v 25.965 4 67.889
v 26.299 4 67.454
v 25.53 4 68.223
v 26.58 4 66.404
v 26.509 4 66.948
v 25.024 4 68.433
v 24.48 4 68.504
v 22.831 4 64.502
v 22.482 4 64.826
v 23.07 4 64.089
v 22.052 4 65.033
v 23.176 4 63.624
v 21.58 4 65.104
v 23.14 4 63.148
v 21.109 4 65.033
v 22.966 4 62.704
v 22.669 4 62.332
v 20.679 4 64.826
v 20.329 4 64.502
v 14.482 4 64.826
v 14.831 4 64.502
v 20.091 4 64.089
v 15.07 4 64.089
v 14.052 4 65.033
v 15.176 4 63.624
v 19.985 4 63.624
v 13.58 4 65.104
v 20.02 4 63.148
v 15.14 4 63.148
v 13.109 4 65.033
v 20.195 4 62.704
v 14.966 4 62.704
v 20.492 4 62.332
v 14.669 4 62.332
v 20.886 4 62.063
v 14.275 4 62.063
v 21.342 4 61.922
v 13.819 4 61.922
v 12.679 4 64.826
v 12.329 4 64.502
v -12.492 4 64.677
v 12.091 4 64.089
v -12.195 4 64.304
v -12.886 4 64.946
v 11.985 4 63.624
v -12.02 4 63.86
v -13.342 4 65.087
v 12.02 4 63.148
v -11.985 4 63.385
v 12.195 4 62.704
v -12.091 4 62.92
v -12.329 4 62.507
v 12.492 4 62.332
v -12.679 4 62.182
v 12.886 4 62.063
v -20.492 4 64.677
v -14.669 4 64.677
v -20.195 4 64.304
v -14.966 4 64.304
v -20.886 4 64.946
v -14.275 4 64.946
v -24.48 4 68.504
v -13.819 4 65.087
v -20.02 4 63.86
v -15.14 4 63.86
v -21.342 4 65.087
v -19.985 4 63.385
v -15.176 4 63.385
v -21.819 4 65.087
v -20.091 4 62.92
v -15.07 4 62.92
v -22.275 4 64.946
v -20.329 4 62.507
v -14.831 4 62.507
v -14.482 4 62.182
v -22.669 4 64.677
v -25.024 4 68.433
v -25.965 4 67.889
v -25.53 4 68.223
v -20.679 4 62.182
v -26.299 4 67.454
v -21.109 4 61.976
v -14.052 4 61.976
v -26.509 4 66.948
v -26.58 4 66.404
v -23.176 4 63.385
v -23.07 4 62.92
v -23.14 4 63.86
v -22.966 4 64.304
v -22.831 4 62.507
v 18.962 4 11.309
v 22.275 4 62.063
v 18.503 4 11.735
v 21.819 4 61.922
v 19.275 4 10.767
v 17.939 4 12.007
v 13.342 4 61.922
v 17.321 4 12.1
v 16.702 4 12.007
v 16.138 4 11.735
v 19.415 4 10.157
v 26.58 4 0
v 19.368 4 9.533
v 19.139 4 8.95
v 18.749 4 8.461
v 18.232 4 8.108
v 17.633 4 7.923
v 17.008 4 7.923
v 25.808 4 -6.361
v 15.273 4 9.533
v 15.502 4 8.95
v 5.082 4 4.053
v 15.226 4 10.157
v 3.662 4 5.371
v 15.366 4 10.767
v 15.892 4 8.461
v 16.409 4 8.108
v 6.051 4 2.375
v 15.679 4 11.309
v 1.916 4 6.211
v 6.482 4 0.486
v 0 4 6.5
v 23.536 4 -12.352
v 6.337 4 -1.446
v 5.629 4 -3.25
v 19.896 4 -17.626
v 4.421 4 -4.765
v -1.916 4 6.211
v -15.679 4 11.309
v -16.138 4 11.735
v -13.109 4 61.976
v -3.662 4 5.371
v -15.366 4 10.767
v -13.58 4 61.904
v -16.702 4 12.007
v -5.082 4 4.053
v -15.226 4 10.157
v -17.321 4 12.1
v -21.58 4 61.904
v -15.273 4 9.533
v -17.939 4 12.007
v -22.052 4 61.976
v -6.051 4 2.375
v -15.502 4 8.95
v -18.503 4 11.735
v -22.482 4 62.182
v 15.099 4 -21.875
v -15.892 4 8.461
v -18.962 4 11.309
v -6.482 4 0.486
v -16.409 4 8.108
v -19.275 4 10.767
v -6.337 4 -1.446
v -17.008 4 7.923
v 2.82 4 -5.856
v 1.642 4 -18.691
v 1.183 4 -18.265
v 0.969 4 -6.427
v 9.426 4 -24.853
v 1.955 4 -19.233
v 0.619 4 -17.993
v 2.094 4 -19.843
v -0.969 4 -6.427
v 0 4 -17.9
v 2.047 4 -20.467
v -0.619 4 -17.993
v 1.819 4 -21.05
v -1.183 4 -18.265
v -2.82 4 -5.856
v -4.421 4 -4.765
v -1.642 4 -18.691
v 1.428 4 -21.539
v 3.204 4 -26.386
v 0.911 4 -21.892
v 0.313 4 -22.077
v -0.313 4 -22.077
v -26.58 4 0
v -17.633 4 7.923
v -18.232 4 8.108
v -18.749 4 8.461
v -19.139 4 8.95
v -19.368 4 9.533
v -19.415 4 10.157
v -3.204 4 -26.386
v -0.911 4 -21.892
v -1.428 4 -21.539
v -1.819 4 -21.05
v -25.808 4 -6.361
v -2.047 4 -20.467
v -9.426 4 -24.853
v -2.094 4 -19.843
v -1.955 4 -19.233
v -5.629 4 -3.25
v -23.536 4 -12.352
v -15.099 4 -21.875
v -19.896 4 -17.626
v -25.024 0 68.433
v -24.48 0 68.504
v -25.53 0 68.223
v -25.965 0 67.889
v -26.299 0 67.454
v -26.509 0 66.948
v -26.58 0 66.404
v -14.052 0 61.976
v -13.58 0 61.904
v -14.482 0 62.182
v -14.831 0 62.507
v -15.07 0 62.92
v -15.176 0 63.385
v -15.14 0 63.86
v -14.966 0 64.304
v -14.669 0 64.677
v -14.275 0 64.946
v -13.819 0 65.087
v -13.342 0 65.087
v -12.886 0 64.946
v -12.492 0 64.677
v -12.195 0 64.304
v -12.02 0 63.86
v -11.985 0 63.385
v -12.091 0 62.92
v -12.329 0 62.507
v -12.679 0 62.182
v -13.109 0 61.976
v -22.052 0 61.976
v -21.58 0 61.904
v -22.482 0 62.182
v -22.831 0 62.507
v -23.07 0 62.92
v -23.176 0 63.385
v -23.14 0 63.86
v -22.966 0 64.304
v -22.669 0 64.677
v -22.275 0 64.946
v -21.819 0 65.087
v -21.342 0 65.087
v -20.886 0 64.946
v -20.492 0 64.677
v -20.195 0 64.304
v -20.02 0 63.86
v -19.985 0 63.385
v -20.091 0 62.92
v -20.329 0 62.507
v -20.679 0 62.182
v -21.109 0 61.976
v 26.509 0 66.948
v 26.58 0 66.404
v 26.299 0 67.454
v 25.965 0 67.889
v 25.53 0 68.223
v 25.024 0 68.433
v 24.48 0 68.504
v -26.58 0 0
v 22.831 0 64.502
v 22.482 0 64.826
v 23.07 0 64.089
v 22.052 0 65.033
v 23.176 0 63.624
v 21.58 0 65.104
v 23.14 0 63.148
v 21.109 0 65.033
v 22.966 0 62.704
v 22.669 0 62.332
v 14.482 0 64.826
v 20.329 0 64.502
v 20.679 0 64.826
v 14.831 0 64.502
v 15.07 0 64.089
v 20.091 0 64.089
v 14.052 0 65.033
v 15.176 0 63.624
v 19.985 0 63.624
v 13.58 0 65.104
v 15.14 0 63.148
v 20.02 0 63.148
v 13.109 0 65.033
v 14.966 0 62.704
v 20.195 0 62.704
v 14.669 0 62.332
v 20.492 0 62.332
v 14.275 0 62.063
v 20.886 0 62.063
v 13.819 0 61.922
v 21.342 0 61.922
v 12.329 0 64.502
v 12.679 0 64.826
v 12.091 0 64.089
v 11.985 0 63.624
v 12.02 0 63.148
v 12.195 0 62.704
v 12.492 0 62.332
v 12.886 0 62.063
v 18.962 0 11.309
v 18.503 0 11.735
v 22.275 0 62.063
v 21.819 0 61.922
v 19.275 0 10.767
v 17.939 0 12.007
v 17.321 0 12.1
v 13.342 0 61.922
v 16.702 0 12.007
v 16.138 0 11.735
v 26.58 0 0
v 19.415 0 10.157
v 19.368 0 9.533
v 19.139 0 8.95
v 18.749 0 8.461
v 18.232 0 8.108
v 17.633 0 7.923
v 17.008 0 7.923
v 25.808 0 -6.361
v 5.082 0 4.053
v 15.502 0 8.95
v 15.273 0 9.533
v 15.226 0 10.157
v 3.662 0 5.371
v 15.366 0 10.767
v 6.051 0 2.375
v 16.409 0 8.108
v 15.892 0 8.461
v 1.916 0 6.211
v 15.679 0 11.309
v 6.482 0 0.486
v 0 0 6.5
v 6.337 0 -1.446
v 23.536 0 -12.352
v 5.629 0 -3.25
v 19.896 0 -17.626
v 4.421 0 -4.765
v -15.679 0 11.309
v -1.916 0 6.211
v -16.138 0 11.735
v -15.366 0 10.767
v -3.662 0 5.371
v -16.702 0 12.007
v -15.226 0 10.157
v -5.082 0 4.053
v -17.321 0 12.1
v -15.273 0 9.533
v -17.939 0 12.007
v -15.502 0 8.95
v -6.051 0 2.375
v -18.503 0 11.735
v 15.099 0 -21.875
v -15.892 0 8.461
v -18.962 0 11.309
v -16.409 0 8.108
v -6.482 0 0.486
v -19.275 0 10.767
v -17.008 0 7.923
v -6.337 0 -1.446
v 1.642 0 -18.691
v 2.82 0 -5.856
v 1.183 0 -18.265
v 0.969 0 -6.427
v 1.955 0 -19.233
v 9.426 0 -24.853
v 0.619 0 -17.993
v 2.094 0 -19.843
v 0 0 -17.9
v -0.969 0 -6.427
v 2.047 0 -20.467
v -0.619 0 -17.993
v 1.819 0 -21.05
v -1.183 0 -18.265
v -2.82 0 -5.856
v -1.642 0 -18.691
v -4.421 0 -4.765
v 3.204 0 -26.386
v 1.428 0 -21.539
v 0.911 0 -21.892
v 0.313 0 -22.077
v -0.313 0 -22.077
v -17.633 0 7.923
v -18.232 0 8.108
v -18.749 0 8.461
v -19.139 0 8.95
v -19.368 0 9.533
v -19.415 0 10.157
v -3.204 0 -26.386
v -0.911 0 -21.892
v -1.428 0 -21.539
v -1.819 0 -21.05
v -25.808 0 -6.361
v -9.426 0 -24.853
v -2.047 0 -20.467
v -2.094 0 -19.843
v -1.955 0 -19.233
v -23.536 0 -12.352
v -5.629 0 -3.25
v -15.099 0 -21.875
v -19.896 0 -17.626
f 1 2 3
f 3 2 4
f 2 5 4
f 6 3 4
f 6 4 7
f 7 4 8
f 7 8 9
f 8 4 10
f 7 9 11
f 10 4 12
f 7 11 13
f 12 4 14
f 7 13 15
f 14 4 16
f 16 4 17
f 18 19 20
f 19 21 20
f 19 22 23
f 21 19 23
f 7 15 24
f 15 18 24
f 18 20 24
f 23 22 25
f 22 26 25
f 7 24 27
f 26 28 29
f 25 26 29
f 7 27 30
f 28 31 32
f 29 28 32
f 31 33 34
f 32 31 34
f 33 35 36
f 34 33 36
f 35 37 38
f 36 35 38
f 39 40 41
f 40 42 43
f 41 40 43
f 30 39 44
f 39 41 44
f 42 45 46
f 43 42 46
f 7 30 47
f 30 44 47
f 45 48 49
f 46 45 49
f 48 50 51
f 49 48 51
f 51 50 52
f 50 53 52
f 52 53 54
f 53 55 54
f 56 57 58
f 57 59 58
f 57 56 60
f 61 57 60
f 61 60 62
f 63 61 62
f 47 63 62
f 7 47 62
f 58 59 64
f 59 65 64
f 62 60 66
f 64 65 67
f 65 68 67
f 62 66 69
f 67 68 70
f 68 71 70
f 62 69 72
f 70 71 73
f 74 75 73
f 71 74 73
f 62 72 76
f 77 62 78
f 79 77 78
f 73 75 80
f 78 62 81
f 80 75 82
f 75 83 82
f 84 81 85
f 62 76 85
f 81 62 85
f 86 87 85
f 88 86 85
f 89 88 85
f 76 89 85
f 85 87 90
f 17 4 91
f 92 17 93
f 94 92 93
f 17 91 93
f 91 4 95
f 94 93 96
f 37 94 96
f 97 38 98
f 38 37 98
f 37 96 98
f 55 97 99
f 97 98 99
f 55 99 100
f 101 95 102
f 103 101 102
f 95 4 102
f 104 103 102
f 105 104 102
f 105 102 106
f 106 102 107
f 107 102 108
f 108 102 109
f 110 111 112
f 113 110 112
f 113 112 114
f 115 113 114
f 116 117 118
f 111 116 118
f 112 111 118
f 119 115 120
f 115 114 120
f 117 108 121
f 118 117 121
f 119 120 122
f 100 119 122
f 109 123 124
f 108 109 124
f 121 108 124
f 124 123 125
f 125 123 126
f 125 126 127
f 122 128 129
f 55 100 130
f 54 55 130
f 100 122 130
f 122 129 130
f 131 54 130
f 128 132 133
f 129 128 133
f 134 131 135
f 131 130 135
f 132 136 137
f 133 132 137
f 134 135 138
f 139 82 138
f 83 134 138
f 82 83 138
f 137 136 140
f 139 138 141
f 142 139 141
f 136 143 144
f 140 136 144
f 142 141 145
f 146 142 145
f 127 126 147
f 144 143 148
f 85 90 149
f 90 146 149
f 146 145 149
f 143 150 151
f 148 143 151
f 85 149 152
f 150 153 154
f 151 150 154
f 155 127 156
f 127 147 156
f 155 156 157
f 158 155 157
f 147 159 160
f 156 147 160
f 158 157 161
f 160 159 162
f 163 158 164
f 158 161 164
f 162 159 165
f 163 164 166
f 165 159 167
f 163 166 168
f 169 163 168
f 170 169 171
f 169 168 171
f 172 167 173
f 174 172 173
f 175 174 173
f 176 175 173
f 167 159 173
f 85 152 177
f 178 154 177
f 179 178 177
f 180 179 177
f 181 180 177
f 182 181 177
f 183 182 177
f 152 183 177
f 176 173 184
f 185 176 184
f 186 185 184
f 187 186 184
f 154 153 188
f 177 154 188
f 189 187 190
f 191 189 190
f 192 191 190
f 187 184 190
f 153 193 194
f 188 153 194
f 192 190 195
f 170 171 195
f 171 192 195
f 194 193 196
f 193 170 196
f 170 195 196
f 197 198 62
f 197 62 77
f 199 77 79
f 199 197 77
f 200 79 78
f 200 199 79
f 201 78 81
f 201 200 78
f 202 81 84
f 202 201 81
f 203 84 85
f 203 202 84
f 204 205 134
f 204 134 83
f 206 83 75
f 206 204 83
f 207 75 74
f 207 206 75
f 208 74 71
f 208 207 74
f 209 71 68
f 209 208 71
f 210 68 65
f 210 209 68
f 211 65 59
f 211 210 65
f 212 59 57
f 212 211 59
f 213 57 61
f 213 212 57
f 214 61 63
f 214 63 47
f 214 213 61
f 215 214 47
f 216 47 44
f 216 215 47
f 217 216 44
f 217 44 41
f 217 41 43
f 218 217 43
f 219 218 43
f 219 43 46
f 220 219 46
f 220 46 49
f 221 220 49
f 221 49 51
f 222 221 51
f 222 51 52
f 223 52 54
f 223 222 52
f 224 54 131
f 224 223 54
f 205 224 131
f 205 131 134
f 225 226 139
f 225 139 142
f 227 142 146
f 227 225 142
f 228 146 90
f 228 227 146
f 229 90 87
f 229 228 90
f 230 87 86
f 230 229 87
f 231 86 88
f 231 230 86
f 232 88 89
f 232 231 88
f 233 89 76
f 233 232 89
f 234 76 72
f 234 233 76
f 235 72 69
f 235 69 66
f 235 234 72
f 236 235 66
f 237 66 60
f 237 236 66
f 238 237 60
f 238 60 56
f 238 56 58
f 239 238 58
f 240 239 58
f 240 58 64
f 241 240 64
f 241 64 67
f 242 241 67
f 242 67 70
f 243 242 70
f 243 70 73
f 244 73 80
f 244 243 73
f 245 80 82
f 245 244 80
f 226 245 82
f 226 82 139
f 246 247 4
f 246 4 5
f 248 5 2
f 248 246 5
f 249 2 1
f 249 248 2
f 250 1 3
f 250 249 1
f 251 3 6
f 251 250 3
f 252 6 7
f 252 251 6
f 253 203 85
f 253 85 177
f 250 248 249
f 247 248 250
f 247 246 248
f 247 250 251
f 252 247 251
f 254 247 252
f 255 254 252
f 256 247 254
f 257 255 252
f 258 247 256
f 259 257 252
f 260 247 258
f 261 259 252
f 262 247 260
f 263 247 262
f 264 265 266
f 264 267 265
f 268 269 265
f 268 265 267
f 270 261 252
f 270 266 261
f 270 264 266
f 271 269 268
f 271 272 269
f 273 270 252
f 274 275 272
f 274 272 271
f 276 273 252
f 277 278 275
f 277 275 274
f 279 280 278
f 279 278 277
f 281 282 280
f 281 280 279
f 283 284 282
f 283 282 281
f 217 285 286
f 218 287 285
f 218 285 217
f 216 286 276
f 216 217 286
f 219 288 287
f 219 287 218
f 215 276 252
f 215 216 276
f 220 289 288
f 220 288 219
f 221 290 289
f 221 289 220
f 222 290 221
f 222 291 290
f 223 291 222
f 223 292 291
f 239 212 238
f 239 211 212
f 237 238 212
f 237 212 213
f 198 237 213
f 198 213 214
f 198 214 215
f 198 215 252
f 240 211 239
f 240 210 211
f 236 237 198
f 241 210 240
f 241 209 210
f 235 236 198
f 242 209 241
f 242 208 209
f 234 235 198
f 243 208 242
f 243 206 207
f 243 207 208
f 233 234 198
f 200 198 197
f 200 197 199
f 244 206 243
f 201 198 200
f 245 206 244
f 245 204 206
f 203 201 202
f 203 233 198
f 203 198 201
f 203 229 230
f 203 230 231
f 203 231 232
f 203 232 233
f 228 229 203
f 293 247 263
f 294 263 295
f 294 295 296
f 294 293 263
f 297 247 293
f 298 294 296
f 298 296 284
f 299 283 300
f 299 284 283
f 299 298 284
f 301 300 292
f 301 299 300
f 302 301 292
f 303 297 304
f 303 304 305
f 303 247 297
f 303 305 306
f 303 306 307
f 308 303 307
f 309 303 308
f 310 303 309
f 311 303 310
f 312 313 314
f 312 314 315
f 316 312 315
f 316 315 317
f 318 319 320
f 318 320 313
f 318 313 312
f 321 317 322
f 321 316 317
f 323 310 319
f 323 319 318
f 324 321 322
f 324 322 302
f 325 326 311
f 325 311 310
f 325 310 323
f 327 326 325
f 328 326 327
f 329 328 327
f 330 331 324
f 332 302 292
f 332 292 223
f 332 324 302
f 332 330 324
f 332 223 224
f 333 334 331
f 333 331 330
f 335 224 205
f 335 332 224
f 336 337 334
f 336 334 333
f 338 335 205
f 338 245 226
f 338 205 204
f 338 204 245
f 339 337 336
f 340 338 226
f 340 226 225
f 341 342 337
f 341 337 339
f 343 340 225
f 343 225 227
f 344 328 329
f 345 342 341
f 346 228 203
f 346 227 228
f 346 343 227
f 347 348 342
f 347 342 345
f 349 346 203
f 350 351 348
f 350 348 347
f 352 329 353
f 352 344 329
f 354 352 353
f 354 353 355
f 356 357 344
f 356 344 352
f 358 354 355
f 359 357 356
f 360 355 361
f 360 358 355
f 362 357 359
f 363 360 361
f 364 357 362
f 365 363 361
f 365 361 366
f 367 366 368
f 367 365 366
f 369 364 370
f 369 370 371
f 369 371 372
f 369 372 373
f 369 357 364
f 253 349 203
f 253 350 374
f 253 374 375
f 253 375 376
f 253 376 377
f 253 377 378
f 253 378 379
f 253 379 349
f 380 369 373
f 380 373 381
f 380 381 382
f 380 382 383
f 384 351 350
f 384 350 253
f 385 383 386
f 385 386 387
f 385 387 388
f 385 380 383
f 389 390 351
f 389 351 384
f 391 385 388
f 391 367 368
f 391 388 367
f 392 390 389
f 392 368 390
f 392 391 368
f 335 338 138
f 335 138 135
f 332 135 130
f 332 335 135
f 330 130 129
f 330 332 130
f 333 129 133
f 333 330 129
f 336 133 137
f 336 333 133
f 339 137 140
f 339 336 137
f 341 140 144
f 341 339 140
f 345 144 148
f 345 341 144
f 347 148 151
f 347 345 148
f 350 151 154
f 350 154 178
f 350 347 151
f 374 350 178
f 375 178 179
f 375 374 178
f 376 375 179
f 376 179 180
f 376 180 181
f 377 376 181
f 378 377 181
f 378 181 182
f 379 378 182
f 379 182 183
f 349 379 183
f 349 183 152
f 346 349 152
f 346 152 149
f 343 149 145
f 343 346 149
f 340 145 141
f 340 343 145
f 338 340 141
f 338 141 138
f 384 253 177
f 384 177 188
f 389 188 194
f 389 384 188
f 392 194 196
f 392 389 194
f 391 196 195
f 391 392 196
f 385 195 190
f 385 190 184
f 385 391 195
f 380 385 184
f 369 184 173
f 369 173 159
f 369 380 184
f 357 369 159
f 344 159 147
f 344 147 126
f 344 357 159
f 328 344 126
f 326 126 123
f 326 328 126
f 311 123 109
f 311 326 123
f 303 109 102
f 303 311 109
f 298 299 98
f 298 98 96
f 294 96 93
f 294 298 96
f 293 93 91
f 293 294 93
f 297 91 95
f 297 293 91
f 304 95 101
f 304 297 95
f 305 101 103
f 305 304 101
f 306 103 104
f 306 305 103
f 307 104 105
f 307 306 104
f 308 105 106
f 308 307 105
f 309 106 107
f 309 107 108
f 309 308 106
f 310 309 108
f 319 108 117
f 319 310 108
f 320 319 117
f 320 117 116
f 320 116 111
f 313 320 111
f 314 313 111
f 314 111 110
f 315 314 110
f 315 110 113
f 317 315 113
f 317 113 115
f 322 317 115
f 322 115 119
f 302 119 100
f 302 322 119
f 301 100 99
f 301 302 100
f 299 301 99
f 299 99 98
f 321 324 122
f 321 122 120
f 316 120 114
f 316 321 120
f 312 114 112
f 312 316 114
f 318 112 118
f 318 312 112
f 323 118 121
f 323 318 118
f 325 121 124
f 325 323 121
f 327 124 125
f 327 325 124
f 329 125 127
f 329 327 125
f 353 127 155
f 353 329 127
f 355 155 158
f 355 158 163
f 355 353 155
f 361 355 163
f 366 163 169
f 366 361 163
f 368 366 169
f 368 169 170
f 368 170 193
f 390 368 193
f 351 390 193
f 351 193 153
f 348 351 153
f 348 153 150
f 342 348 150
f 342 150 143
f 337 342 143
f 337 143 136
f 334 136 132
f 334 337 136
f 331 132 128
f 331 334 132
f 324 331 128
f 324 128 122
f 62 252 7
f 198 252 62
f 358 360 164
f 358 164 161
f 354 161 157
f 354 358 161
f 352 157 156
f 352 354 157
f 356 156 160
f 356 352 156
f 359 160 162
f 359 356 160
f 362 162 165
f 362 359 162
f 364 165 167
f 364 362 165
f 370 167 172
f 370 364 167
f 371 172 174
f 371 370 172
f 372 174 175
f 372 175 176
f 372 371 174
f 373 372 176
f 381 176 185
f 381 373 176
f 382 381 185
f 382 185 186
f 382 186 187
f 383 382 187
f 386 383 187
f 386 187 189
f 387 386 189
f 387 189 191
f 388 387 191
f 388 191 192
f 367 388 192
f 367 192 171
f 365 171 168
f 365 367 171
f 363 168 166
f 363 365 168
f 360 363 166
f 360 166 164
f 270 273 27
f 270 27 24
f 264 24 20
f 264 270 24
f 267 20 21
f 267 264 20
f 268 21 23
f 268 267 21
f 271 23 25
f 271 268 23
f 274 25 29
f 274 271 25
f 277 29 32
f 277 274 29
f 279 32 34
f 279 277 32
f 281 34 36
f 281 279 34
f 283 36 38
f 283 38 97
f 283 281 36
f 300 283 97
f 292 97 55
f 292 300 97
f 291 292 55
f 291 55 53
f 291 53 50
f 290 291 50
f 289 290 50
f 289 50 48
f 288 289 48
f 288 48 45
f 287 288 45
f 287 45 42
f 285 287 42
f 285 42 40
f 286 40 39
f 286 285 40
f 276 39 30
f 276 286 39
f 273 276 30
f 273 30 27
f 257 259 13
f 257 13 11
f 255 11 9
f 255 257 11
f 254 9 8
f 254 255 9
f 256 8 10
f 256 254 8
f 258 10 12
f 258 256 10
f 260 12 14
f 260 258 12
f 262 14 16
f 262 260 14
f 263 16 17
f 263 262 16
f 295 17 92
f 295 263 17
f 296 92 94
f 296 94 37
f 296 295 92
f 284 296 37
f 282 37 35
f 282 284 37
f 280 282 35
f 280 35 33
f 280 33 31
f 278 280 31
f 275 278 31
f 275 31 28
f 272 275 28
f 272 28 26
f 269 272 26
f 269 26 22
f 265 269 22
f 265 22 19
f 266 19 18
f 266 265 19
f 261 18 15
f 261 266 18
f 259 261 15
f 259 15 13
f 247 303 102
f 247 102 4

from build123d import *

# Parameters (mm, degrees)
SKETCH_1_R      = 6.5
SKETCH_1_R_2    = 2.1
SKETCH_1_R_3    = 1.6
EXTRUDE_2_DEPTH = 4


with BuildPart() as part:
    # 草图1 → 凸台-拉伸2 (new body)
    with BuildSketch(Plane(origin=(0, 0, 0), x_dir=(1, 0, 0), z_dir=(0, 1, 0))):
        with BuildLine():
            Line((-26.580295873, -66.404426064), (-26.580295873, 0))
            ThreePointArc((-26.580295873, 0), (0, 26.580295873), (26.580295873, 0))
            Line((26.580295873, 0), (26.580295873, -66.404426064))
            ThreePointArc((26.580295873, -66.404426064), (25.965220113, -67.889350304), (24.480295873, -68.504426064))
            Line((24.480295873, -68.504426064), (-24.480295873, -68.504426064))
            ThreePointArc((-24.480295873, -68.504426064), (-25.965220113, -67.889350304), (-26.580295873, -66.404426064))
        make_face()
        with Locations(Location((0, 0, 0), (0, 0, 270))):
            Circle(SKETCH_1_R, mode=Mode.SUBTRACT)
        with Locations(Location((0, 20, 0), (0, 0, 270))):
            Circle(SKETCH_1_R_2, mode=Mode.SUBTRACT)
        with Locations(Location((-17.320508076, -10, 0), (0, 0, 270))):
            Circle(SKETCH_1_R_2, mode=Mode.SUBTRACT)
        with Locations(Location((17.32050808, -10, 0), (0, 0, 270))):
            Circle(SKETCH_1_R_2, mode=Mode.SUBTRACT)
        with Locations(Location((21.580295873, -63.504426064, 0), (0, 0, 270))):
            Circle(SKETCH_1_R_3, mode=Mode.SUBTRACT)
        with Locations(Location((13.580295873, -63.504426064, 0), (0, 0, 270))):
            Circle(SKETCH_1_R_3, mode=Mode.SUBTRACT)
        with Locations(Location((-13.580295873, -63.504426064, 0), (0, 0, 90))):
            Circle(SKETCH_1_R_3, mode=Mode.SUBTRACT)
        with Locations(Location((-21.580295873, -63.504426064, 0), (0, 0, 90))):
            Circle(SKETCH_1_R_3, mode=Mode.SUBTRACT)
    extrude(amount=EXTRUDE_2_DEPTH)


solid = part.part
